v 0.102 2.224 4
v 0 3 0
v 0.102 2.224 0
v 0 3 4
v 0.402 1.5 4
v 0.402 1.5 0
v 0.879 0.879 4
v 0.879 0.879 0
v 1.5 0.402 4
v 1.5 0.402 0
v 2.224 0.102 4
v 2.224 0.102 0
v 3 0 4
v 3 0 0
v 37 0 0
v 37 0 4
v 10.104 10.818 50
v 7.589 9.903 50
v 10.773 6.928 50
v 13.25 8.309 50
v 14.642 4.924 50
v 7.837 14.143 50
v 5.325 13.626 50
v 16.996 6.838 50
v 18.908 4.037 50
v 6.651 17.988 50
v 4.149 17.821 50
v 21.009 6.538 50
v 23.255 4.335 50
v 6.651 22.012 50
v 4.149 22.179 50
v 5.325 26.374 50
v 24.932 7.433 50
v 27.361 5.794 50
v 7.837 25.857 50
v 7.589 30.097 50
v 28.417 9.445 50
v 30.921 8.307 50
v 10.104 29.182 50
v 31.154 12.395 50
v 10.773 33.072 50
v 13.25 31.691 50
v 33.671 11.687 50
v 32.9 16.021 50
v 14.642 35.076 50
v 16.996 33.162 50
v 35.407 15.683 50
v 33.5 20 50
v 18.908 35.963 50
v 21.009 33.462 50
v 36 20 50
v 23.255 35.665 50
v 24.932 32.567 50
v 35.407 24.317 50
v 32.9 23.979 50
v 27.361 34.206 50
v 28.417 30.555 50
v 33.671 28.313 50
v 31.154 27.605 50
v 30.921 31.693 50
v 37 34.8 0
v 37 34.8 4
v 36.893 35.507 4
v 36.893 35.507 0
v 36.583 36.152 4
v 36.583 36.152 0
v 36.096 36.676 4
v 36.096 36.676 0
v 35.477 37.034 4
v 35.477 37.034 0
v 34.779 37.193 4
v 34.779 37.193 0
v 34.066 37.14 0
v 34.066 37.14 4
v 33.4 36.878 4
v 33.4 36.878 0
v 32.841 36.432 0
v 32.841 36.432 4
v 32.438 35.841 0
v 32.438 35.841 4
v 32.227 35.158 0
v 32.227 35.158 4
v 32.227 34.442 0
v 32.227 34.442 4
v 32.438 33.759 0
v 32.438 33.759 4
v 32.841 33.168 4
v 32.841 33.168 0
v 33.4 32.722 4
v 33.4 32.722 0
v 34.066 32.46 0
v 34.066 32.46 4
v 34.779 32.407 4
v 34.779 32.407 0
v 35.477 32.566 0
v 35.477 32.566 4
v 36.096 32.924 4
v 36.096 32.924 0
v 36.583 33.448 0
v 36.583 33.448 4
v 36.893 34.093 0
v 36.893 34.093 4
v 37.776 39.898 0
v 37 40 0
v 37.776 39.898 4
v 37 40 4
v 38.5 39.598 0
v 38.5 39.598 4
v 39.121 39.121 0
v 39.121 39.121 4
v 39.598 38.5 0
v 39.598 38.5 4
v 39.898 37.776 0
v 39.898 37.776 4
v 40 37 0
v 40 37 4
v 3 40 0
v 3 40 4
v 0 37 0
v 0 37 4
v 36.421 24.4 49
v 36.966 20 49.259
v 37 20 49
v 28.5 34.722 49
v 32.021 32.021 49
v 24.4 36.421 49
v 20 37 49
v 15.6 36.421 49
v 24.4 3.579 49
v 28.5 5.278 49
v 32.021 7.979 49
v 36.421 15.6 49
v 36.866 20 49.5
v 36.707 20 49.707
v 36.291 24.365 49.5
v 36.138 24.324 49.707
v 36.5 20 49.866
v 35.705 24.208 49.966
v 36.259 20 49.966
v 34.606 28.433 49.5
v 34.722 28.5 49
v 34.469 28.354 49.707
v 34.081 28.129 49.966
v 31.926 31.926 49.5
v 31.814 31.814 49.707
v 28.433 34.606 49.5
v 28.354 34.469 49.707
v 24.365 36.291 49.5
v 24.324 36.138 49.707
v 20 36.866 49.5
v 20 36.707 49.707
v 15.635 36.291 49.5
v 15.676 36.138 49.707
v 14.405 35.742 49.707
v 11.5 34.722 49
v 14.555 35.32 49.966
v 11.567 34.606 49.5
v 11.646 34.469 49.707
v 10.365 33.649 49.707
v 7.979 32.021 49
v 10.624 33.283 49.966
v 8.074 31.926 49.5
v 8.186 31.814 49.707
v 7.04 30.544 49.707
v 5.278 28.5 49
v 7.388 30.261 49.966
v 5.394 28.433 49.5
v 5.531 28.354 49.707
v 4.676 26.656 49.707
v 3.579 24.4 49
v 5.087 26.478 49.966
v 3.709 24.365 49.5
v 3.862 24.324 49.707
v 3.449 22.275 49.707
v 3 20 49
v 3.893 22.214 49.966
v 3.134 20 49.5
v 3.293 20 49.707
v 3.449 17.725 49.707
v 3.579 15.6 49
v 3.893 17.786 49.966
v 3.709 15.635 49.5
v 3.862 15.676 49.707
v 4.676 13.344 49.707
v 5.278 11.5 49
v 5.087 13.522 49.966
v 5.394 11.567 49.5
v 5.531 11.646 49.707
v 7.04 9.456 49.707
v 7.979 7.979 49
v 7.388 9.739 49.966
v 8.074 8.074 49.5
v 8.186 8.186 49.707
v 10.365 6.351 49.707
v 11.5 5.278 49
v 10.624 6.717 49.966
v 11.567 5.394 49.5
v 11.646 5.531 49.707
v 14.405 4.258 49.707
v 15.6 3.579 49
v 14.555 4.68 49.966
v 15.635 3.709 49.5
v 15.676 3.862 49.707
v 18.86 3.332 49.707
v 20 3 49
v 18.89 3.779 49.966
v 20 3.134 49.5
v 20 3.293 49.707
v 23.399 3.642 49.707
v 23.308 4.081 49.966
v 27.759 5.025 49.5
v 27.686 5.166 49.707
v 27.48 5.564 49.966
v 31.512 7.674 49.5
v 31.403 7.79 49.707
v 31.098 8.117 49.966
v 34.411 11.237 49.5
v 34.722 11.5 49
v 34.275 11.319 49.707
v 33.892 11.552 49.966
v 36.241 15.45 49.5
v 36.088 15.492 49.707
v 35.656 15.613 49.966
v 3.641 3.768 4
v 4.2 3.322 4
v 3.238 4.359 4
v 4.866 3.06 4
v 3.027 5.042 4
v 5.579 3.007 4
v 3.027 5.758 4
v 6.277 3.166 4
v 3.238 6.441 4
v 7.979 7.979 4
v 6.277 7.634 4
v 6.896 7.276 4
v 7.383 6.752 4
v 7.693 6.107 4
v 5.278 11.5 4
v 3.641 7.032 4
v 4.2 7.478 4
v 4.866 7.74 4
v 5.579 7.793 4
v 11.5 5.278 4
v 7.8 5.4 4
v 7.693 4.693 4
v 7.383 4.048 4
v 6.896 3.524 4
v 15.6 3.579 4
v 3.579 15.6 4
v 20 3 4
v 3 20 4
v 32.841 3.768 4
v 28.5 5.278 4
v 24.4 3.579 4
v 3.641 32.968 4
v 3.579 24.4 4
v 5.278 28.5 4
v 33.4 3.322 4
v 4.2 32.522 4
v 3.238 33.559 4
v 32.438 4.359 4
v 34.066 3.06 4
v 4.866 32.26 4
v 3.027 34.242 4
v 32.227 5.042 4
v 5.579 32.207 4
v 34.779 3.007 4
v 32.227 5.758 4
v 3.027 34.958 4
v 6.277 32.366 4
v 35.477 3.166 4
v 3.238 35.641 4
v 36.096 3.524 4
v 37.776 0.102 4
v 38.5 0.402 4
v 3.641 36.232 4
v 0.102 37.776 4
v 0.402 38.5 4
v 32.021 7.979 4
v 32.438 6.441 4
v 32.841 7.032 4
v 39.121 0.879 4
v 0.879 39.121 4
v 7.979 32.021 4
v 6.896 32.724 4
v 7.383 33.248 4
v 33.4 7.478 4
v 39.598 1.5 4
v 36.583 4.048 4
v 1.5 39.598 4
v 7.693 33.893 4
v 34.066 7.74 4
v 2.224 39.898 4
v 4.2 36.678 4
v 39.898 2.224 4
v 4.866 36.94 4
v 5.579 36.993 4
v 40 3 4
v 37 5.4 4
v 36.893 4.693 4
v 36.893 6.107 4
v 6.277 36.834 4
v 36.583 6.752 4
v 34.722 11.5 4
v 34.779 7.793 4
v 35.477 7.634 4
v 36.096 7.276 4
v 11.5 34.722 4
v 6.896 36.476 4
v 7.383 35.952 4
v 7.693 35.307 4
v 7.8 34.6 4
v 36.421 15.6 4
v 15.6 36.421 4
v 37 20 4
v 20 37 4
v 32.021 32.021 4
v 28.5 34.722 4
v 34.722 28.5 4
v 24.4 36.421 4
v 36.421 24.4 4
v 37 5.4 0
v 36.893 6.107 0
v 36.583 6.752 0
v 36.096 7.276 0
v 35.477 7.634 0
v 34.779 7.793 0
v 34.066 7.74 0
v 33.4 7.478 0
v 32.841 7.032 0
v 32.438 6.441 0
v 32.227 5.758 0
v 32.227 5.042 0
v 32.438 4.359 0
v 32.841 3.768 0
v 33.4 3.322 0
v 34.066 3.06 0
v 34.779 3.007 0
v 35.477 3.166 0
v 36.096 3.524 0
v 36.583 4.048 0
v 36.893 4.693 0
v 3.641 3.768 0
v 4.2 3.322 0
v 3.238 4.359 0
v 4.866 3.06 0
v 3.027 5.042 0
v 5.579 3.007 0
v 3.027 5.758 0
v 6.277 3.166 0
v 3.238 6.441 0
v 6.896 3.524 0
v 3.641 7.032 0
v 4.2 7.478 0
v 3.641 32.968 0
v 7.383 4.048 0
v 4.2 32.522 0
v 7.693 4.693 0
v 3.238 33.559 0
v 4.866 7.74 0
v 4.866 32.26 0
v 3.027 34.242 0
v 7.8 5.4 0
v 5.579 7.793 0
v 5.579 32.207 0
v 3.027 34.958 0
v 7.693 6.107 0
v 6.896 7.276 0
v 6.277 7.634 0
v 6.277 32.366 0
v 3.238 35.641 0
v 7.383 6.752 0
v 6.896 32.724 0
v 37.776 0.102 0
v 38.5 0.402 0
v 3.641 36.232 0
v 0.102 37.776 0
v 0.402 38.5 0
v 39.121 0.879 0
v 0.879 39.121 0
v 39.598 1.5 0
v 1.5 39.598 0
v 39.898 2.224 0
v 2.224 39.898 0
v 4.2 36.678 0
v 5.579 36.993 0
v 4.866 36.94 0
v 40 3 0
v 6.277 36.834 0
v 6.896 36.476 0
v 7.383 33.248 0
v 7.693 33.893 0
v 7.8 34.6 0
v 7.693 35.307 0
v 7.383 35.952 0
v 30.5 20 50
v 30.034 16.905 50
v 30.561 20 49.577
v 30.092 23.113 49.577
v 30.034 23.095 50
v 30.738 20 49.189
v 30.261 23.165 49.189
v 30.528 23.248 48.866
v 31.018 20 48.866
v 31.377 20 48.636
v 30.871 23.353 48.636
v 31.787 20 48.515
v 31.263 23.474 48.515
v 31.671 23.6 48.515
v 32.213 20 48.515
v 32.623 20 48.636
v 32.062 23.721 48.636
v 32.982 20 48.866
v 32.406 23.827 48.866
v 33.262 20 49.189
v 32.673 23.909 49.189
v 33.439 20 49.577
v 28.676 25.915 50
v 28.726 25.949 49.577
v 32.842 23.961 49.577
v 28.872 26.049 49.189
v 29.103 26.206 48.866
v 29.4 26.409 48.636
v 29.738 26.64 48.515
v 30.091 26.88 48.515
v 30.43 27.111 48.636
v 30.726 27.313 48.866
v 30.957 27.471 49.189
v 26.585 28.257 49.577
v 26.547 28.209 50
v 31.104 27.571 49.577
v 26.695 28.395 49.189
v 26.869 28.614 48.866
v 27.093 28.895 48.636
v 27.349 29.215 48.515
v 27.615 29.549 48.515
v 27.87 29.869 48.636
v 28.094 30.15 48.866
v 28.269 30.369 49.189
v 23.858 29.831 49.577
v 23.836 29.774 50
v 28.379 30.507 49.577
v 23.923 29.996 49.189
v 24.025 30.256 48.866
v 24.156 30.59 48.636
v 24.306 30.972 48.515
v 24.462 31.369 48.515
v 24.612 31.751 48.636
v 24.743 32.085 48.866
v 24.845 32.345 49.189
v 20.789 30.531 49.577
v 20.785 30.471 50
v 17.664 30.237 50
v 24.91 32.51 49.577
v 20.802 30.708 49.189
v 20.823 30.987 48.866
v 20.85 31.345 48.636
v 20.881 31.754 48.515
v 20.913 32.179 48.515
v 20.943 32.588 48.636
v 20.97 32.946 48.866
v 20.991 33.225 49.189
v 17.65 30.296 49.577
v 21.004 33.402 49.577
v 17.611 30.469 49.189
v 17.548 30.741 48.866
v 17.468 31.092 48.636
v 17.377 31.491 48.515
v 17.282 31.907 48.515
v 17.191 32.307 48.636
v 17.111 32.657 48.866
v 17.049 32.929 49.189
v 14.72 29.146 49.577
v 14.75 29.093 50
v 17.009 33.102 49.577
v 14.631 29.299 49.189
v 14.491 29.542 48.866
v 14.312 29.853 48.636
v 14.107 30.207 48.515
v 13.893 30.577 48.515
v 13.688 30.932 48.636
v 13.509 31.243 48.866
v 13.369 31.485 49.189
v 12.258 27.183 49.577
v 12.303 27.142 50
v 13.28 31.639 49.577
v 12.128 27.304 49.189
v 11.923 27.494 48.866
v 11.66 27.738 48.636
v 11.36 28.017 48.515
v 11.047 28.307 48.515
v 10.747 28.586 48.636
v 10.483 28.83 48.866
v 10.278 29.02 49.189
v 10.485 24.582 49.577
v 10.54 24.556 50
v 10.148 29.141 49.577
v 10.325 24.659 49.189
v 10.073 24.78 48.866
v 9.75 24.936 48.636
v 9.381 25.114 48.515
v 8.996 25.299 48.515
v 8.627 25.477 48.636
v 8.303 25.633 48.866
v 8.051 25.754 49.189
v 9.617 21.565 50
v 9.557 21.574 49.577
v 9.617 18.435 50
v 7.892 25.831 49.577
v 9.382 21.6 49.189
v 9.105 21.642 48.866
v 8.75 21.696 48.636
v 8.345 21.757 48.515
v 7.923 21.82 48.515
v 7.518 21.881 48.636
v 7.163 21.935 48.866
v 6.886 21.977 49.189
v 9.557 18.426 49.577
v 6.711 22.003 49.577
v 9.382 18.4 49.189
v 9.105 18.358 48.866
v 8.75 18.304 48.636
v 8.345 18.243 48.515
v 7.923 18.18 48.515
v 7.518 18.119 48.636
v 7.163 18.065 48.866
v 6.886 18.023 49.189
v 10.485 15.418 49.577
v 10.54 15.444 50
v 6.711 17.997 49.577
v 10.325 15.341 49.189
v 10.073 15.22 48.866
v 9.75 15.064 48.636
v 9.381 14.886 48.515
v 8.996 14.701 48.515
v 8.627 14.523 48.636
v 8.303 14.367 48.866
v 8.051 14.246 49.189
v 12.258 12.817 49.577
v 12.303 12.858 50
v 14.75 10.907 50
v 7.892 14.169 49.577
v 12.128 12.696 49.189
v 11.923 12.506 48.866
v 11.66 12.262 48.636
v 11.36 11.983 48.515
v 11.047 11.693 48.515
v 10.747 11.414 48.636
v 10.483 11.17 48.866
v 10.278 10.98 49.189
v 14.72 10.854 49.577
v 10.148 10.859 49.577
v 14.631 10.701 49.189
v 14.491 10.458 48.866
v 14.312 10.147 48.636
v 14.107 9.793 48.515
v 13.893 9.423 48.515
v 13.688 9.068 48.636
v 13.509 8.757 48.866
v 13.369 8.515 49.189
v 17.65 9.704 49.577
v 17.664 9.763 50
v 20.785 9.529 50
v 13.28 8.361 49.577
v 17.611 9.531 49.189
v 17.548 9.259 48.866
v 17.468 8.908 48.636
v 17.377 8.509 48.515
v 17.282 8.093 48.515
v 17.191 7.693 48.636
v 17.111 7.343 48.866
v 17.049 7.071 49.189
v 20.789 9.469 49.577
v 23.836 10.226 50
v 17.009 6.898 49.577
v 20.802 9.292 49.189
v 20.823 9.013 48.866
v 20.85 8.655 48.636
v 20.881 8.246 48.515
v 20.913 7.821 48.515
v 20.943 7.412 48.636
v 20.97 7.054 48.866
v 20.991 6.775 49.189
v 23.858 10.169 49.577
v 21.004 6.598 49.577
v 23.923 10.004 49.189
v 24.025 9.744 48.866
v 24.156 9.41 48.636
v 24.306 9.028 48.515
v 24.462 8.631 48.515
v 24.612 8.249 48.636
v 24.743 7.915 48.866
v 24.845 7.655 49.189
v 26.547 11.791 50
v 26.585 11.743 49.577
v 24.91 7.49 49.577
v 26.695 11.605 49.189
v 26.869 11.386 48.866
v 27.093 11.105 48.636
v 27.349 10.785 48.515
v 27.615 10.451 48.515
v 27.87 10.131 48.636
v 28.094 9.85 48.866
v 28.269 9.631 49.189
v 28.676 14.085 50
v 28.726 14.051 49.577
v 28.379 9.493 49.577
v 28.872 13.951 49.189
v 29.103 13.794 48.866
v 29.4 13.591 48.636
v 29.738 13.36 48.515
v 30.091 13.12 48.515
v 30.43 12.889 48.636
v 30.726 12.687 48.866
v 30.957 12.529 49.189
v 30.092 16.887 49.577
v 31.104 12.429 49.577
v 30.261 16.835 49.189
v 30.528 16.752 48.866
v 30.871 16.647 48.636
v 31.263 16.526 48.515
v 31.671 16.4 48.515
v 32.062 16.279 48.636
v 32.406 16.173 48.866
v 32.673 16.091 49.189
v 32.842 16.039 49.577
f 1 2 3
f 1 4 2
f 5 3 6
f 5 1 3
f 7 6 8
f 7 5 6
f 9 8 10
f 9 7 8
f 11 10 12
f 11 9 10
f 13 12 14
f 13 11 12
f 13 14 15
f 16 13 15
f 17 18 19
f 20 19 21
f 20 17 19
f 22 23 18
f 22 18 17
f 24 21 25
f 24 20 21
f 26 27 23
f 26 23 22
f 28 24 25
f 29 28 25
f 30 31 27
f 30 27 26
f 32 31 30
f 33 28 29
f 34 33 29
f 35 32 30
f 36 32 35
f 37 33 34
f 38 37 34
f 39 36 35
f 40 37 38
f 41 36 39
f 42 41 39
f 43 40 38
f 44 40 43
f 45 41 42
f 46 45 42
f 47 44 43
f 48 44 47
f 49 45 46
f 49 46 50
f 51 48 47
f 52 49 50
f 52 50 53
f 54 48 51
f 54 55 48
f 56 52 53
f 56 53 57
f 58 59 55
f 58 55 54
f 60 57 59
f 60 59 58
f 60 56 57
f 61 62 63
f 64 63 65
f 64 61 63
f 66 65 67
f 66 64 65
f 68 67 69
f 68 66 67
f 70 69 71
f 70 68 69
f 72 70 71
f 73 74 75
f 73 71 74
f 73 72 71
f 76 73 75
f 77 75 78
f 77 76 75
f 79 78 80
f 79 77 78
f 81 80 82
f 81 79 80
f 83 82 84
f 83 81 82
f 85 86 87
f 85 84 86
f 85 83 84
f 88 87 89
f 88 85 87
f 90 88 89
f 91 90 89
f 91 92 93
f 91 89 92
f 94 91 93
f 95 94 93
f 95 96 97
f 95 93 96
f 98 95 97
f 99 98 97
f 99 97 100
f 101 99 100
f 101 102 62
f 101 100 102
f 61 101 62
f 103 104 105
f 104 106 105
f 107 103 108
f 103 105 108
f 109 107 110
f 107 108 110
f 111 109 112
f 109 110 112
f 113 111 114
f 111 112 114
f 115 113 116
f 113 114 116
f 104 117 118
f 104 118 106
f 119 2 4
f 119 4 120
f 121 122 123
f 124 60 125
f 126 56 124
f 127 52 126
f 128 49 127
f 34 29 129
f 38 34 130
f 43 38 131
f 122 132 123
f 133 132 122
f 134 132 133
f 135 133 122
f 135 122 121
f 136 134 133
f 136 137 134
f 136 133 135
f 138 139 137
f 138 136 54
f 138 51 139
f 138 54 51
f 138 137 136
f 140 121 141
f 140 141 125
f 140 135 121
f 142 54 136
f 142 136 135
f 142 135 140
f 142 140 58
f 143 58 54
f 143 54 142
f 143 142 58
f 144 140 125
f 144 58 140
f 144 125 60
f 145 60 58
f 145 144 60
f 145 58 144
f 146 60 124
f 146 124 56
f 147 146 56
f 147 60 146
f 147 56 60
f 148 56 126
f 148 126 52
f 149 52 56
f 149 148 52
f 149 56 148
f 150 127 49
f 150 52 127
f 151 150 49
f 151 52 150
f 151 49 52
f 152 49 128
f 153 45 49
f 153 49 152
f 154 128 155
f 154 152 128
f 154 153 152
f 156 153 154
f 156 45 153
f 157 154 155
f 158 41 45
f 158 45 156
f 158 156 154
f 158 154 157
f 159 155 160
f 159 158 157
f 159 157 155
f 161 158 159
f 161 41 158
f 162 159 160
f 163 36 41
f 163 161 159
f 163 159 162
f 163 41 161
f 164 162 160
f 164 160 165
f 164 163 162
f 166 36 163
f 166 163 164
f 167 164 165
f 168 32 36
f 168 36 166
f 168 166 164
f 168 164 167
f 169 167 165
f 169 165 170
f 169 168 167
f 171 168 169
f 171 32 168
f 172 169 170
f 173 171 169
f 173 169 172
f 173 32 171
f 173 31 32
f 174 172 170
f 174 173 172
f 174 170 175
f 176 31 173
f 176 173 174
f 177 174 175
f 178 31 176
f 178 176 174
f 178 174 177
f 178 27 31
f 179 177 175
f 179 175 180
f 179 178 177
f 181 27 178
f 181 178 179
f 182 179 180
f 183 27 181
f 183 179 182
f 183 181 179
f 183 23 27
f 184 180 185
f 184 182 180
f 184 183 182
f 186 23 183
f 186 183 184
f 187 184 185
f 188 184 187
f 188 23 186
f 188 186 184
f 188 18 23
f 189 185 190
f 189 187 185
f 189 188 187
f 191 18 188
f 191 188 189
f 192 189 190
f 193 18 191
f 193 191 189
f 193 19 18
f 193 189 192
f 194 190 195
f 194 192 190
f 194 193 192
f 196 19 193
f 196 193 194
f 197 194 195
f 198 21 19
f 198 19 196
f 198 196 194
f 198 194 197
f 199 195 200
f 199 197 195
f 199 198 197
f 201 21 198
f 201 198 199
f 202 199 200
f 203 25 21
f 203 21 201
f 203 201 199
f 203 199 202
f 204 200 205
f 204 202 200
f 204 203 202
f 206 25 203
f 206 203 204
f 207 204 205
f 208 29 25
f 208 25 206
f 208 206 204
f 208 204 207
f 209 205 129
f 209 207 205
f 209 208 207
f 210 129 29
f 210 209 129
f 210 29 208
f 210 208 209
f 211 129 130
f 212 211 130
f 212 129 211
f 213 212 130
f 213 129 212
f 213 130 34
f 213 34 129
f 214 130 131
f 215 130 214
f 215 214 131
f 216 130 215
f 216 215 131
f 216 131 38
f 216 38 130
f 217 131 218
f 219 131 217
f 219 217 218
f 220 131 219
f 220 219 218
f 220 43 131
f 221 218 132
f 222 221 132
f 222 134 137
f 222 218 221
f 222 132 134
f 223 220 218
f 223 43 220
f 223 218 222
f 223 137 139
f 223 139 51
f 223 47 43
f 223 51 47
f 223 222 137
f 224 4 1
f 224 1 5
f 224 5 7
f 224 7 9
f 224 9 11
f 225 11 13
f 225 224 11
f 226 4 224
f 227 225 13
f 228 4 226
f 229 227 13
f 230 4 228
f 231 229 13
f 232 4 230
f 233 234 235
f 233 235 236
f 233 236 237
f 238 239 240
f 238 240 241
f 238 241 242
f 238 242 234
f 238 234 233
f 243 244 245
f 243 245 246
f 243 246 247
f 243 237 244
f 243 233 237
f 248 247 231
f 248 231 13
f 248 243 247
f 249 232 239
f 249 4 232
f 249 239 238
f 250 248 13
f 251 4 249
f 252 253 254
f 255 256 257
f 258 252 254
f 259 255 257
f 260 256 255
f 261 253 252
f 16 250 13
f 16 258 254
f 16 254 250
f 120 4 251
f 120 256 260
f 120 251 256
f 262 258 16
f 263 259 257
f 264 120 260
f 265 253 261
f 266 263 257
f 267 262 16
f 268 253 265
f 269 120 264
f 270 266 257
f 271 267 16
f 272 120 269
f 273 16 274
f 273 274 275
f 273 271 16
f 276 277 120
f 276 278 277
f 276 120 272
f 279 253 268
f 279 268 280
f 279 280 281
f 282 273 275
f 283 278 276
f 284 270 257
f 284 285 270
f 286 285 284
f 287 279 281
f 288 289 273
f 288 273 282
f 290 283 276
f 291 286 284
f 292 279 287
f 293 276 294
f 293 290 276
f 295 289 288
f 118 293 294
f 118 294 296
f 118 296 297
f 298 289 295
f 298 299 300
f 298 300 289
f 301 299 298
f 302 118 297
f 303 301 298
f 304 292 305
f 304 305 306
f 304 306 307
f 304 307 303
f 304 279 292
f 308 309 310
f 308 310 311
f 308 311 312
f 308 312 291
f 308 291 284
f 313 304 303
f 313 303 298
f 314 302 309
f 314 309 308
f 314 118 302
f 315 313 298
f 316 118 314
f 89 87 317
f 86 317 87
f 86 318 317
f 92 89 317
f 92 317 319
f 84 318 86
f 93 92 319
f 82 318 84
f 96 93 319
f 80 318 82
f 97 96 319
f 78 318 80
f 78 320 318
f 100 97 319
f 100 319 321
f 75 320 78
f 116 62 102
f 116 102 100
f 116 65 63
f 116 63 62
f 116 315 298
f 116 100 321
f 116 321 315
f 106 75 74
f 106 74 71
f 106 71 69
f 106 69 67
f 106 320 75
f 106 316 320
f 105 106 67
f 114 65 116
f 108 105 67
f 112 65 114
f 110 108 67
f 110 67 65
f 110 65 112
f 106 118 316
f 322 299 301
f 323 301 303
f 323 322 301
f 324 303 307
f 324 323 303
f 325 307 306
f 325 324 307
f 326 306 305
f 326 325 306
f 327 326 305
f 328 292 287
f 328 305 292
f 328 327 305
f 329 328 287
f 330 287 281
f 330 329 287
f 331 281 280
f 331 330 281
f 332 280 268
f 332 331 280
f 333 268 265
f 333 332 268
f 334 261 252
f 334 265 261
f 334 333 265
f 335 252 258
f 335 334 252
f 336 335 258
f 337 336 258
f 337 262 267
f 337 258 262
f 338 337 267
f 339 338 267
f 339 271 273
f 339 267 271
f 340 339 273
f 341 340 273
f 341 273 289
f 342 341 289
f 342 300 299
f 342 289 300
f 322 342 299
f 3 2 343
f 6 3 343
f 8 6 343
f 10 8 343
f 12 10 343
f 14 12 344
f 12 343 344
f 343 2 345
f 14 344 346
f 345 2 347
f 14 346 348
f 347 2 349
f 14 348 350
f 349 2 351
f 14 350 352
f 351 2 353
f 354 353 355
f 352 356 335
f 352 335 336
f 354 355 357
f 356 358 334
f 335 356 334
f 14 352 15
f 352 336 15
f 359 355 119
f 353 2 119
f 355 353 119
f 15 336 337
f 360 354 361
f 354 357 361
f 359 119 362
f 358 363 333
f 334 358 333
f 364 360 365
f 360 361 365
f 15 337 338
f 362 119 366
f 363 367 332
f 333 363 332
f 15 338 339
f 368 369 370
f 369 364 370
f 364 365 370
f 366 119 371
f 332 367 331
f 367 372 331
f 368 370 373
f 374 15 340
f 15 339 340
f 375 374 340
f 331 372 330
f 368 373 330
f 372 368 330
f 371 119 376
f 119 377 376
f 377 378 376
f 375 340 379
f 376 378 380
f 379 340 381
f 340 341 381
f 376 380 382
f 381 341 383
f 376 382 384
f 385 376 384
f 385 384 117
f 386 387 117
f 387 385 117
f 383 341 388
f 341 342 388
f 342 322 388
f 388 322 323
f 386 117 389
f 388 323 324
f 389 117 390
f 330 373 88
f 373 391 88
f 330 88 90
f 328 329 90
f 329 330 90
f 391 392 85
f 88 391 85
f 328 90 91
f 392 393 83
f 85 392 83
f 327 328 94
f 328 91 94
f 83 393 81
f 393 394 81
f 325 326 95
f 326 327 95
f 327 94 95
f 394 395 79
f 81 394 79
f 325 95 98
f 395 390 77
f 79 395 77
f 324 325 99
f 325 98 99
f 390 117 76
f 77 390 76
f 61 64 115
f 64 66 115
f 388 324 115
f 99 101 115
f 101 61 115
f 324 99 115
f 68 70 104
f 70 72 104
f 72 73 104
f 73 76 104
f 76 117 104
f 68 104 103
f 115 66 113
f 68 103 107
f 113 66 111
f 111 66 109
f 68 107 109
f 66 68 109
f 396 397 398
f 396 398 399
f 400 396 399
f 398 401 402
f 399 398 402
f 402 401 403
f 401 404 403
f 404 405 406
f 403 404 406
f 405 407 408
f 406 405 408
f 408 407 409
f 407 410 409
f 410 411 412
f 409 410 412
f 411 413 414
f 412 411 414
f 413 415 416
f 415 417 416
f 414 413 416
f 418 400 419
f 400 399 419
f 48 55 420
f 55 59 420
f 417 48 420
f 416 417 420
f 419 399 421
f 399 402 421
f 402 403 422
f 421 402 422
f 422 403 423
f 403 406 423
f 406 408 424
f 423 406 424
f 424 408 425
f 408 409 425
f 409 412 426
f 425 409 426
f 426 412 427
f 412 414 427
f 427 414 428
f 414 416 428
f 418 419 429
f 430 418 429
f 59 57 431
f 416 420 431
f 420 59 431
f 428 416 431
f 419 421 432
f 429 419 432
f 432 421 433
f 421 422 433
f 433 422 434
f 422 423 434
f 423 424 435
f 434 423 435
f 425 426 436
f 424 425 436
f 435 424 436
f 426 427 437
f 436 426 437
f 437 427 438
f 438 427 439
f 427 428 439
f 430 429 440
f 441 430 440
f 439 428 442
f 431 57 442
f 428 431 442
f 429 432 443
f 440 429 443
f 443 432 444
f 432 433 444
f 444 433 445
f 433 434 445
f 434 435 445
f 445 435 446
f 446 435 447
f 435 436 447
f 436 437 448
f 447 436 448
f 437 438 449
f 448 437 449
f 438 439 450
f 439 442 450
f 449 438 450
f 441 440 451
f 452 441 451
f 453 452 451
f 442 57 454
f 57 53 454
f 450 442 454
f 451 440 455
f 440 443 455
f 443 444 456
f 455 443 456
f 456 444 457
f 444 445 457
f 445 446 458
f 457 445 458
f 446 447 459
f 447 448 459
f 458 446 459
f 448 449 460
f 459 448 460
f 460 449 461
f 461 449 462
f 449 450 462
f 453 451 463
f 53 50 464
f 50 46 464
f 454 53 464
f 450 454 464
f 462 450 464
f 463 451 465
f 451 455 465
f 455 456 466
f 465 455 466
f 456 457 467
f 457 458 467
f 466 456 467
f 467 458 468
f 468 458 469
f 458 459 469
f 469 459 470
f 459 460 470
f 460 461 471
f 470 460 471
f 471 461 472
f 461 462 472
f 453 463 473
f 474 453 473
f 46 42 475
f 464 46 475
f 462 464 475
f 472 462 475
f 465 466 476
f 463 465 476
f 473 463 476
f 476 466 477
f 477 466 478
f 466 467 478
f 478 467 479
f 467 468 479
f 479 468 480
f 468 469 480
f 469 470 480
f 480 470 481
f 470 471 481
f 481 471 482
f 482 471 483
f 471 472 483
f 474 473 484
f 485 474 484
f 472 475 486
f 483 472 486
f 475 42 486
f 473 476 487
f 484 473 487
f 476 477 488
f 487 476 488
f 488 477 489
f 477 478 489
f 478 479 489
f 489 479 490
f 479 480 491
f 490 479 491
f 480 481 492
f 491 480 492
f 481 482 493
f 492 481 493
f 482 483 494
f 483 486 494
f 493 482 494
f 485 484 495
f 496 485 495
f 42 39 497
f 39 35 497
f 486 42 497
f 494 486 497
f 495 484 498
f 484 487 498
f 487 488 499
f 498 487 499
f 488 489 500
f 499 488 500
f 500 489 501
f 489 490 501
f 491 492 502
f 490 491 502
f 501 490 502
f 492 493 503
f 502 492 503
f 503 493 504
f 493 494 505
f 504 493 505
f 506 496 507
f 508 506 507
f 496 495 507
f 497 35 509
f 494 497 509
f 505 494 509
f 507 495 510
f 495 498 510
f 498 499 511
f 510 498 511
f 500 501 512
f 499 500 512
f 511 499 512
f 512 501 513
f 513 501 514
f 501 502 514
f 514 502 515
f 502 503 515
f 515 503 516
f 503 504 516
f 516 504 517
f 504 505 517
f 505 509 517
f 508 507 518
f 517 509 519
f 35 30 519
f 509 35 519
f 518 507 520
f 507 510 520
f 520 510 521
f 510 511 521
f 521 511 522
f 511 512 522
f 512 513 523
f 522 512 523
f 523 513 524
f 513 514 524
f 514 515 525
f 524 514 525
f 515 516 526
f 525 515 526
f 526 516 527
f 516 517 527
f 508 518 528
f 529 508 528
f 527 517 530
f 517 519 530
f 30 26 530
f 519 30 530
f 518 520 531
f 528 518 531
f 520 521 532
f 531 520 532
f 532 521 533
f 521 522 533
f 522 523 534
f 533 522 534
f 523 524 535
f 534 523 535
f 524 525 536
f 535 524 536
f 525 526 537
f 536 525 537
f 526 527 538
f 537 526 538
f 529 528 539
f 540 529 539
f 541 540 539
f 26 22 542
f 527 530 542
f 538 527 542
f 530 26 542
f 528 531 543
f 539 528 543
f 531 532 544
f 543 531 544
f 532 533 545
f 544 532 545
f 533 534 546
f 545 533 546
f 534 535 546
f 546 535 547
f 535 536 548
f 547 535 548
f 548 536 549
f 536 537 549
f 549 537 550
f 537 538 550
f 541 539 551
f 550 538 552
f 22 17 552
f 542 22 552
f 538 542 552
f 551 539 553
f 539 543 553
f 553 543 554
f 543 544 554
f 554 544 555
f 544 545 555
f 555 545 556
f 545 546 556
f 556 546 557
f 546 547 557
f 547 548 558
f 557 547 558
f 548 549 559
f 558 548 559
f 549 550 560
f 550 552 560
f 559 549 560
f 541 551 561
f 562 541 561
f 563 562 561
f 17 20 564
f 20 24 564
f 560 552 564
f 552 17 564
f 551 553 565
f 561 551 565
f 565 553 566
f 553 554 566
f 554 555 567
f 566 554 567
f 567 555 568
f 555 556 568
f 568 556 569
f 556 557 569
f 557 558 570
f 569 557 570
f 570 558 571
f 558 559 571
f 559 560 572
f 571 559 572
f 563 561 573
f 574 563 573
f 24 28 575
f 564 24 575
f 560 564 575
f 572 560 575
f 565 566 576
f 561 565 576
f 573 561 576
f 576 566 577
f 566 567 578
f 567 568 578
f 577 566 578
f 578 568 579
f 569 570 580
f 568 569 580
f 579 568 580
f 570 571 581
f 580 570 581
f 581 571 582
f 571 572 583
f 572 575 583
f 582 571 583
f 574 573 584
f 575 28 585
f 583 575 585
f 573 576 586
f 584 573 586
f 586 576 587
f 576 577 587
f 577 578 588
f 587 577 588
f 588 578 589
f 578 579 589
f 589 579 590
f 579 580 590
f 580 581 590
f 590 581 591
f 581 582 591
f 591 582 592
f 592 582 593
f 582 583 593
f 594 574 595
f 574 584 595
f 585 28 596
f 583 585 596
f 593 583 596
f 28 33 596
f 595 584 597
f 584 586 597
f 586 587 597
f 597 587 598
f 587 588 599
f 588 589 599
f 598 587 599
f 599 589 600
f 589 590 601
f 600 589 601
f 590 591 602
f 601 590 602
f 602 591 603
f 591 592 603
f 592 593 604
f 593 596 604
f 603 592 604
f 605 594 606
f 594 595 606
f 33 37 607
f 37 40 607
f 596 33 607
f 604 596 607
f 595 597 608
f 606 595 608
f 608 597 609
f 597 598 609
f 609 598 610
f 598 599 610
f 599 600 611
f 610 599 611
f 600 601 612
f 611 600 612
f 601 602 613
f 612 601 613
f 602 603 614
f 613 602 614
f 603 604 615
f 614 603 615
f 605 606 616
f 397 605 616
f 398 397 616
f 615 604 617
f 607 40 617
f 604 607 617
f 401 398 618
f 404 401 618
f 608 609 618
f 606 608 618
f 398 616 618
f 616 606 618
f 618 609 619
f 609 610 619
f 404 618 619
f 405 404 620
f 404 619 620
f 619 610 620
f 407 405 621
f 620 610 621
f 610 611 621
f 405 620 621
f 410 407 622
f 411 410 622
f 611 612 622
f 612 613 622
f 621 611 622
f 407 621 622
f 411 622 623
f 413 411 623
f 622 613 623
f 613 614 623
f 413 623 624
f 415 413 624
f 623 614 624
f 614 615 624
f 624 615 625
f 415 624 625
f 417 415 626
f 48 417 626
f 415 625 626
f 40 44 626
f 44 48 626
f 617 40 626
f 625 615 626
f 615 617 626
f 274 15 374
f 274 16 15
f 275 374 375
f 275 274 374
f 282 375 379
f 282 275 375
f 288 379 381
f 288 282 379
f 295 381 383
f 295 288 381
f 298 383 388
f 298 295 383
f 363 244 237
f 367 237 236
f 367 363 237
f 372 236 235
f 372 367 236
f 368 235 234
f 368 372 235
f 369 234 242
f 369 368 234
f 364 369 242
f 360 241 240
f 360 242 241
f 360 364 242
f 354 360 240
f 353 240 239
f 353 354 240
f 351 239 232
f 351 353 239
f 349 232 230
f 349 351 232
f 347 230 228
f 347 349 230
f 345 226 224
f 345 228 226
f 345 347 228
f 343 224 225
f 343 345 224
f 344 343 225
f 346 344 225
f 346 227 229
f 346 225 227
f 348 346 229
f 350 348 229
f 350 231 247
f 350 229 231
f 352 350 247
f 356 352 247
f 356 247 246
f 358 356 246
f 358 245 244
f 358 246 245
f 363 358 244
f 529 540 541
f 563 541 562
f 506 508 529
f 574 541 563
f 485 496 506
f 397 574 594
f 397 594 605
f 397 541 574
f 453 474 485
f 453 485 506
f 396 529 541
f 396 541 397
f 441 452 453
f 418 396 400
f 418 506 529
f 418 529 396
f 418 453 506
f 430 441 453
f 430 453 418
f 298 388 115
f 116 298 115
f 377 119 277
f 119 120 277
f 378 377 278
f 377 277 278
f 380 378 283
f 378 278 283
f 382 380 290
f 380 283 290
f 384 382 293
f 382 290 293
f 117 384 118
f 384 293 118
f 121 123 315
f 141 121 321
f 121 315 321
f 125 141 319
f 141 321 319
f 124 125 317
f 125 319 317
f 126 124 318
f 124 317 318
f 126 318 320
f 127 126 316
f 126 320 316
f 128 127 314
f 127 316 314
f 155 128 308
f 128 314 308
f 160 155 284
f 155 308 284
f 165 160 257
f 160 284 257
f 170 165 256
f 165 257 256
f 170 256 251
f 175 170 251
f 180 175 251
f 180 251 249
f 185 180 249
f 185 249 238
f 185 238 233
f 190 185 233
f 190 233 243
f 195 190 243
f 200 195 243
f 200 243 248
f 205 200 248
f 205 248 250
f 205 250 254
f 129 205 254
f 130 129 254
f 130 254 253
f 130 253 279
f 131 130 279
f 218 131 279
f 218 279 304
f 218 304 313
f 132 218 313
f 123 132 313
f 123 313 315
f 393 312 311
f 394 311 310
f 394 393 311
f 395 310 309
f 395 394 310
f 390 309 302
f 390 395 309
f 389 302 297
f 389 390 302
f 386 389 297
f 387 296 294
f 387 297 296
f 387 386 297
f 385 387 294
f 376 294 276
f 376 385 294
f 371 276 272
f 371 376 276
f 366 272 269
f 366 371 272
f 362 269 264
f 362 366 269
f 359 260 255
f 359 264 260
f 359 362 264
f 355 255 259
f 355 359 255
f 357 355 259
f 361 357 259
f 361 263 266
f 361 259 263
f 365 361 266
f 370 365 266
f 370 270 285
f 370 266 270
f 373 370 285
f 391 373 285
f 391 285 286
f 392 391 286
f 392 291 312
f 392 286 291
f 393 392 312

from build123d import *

# Parameters (mm, degrees)
TORUS_R           = 1.5
CYLINDER004_R     = 17
CYLINDER004_DEPTH = 50
FILLET001_R       = 1
CYLINDER002_R     = 2.4
CYLINDER002_DEPTH = 10
CYLINDER001_R     = 2.4
CYLINDER001_DEPTH = 10
CYLINDER_R        = 2.4
CYLINDER_DEPTH    = 10
CYLINDER003_R     = 2.4
CYLINDER003_DEPTH = 10
BOX_W             = 40
BOX_H             = 40
BOX_DEPTH         = 4
FILLET_R          = 3


with BuildPart() as torus:
    # Torus → Torus (revolve)
    with BuildSketch(Plane(origin=(20, 20, 50), x_dir=(1, 0, 0), z_dir=(0, -1, 0))):
        with Locations((12, 0)):
            Circle(TORUS_R)
    revolve(axis=Axis((20, 20, 50), (0, 0, 1)))


with BuildPart() as fillet001:
    # Cylinder004 → Cylinder004 (new body)
    with BuildSketch(Plane(origin=(20, 20, 0), x_dir=(1, 0, 0), z_dir=(0, 0, 1))):
        Circle(CYLINDER004_R)
    extrude(amount=CYLINDER004_DEPTH)

    # Fillet001
    fillet001_edges = [fillet001.edges().sort_by_distance(p)[0] for p in [
        (3, 20, 50),
    ]]
    fillet(fillet001_edges, radius=FILLET001_R)


with BuildPart() as cilindre002:
    # Cylinder002 → Cylinder002 (new body)
    with BuildSketch(Plane(origin=(5.4, 5.4, 0), x_dir=(1, 0, 0), z_dir=(0, 0, 1))):
        Circle(CYLINDER002_R)
    extrude(amount=CYLINDER002_DEPTH)


with BuildPart() as cilindre001:
    # Cylinder001 → Cylinder001 (new body)
    with BuildSketch(Plane(origin=(5.4, 34.6, 0), x_dir=(1, 0, 0), z_dir=(0, 0, 1))):
        Circle(CYLINDER001_R)
    extrude(amount=CYLINDER001_DEPTH)


with BuildPart() as fusion:
    # Cylinder → Cylinder (new body)
    with BuildSketch(Plane(origin=(34.6, 34.8, 0), x_dir=(1, 0, 0), z_dir=(0, 0, 1))):
        Circle(CYLINDER_R)
    extrude(amount=CYLINDER_DEPTH)

    # Fusion: union Cilindre001
    add(cilindre001.part)


with BuildPart() as fusion001:
    # Cylinder003 → Cylinder003 (new body)
    with BuildSketch(Plane(origin=(34.6, 5.4, 0), x_dir=(1, 0, 0), z_dir=(0, 0, 1))):
        Circle(CYLINDER003_R)
    extrude(amount=CYLINDER003_DEPTH)

    # Fusion001: union Fusion
    add(fusion.part)


with BuildPart() as cut002:
    # Box → Box (new body)
    with BuildSketch(Plane.XY):
        with Locations((20, 20)):
            Rectangle(BOX_W, BOX_H)
    extrude(amount=BOX_DEPTH)

    # Cut: cut Fusion001
    add(fusion001.part, mode=Mode.SUBTRACT)

    # Cut001: cut Cilindre002
    add(cilindre002.part, mode=Mode.SUBTRACT)

    # Fillet
    fillet_edges = [cut002.edges().sort_by_distance(p)[0] for p in [
        (0, 0, 2),
        (0, 40, 2),
        (40, 0, 2),
        (40, 40, 2),
    ]]
    fillet(fillet_edges, radius=FILLET_R)

    # Fusion002: union Fillet001
    add(fillet001.part)

    # Cut002: cut Torus
    add(torus.part, mode=Mode.SUBTRACT)


solid = cut002.part
